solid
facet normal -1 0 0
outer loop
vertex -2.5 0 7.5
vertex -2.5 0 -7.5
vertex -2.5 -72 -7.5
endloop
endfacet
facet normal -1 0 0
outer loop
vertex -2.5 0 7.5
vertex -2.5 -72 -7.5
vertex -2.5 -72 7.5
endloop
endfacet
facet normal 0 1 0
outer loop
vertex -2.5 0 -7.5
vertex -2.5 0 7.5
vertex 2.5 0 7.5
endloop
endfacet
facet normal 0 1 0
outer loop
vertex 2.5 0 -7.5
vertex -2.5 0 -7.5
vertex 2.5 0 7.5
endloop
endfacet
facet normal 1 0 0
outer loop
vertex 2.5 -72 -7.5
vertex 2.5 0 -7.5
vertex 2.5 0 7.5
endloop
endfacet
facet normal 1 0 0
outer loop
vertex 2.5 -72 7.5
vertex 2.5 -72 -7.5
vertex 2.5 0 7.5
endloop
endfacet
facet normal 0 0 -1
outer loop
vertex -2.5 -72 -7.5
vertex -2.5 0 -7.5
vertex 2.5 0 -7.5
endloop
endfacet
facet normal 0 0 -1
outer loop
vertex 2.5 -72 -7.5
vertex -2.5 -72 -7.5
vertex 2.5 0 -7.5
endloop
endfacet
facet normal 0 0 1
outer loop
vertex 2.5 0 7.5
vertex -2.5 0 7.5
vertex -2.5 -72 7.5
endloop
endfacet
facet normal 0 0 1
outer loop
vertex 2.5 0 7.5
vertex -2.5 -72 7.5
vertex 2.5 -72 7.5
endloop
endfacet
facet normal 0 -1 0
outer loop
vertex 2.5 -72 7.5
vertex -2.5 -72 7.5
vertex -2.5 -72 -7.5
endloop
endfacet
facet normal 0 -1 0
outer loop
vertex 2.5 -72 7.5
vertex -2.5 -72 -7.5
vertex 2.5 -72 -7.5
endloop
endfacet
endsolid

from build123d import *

# Parameters (mm, degrees)
F0_W     = 5
F0_H     = 15
F1_DEPTH = 72
F2_DEPTH = 72
F3_DEPTH = 72


with BuildPart() as f1:
    # F0 (on Front) → F1 (new body)
    with BuildSketch(Plane.XZ):
        Rectangle(F0_W, F0_H)
    extrude(amount=F1_DEPTH)

    # F0 (on Front) → F2 (join)
    with BuildSketch(Plane.XZ):
        Rectangle(F0_W, F0_H)
    extrude(amount=F2_DEPTH)

    # F0 (on Front) → F3 (join)
    with BuildSketch(Plane.XZ):
        Rectangle(F0_W, F0_H)
    extrude(amount=F3_DEPTH)


solid = f1.part
